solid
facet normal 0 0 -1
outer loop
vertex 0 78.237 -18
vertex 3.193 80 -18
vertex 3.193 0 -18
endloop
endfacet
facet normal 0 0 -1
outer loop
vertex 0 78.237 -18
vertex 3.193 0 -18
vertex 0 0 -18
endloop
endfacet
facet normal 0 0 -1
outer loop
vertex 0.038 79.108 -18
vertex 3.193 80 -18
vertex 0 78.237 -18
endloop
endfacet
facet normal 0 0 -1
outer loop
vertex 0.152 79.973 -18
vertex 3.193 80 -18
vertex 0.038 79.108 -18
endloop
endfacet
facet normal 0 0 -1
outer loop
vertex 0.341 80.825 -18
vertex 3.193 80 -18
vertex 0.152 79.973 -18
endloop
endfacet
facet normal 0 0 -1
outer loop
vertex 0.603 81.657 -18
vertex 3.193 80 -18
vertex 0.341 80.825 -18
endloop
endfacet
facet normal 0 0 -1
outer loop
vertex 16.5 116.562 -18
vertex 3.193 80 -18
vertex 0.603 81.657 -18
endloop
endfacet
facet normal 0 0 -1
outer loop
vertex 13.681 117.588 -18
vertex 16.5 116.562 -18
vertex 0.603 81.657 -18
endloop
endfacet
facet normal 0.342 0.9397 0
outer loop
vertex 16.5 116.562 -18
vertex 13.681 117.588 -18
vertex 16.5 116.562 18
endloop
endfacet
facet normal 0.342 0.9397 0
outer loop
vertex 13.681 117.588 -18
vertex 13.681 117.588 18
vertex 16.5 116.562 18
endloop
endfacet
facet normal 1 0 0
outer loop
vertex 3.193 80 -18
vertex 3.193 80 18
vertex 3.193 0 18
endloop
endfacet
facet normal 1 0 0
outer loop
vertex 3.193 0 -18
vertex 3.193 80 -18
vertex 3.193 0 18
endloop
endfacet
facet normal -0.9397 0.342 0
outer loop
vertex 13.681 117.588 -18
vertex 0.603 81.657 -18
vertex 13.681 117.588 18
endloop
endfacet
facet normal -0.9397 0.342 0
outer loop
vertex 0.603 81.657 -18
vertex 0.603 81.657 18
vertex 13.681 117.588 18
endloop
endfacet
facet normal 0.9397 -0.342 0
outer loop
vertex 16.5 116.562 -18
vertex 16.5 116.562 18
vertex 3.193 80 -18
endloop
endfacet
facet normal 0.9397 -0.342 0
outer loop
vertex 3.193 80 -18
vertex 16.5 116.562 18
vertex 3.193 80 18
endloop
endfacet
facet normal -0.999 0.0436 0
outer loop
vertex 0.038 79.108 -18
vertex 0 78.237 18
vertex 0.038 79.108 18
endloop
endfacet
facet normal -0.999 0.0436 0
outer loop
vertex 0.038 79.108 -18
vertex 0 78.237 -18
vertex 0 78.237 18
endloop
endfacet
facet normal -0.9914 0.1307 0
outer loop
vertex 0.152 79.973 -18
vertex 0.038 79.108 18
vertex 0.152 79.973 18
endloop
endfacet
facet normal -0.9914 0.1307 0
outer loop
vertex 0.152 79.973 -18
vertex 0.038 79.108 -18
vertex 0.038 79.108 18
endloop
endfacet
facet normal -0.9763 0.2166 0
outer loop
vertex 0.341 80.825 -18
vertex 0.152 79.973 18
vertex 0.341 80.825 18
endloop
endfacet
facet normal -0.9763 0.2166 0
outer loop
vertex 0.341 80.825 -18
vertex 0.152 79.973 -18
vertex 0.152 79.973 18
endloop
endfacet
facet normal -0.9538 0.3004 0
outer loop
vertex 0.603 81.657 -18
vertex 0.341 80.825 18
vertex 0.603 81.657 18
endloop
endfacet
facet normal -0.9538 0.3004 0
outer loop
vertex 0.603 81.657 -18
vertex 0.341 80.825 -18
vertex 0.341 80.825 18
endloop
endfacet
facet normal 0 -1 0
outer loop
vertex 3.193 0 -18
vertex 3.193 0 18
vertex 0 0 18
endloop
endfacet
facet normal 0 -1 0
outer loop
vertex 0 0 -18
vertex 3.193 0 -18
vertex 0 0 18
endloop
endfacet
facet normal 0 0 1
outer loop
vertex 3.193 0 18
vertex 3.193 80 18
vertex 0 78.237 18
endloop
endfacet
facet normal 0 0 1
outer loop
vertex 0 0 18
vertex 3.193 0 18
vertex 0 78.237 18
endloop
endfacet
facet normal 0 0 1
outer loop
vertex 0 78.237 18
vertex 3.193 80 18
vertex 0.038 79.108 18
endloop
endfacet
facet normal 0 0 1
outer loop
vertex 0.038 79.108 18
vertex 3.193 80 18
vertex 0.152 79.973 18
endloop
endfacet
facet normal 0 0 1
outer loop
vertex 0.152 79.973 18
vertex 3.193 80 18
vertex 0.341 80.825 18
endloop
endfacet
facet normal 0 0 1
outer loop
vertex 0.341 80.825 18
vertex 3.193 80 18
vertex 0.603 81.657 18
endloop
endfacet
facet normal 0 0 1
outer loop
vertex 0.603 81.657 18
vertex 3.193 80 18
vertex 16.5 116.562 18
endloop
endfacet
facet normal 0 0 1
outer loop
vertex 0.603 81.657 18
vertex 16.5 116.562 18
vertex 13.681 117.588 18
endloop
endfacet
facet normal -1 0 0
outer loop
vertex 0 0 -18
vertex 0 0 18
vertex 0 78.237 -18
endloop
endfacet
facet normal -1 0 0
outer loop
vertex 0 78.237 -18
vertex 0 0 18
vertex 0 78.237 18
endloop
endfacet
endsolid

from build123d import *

# Parameters (mm, degrees)
BOSS_EXTRU_1_DEPTH      = 18
BOSS_EXTRU_1_DEPTH_BACK = 18
CONG_1_R                = 10


with BuildPart() as part:
    # Esquisse1 → Boss.-Extru.1 (new, two sides: drawn at the far end of the back side and taken through both)
    with BuildSketch(Plane.XY.offset(-BOSS_EXTRU_1_DEPTH_BACK)):
        Polygon((0, 0), (0, 80), (13.680805733, 117.587704831), (16.499883595, 116.561644401), (3.192533317, 80), (3.192533317, 0), align=None)
    extrude(amount=BOSS_EXTRU_1_DEPTH + BOSS_EXTRU_1_DEPTH_BACK)

    # Congé1
    cong_1_edges = [part.edges().sort_by_distance(p)[0] for p in [
        (0, 80, 0),
    ]]
    fillet(cong_1_edges, radius=CONG_1_R)


solid = part.part
